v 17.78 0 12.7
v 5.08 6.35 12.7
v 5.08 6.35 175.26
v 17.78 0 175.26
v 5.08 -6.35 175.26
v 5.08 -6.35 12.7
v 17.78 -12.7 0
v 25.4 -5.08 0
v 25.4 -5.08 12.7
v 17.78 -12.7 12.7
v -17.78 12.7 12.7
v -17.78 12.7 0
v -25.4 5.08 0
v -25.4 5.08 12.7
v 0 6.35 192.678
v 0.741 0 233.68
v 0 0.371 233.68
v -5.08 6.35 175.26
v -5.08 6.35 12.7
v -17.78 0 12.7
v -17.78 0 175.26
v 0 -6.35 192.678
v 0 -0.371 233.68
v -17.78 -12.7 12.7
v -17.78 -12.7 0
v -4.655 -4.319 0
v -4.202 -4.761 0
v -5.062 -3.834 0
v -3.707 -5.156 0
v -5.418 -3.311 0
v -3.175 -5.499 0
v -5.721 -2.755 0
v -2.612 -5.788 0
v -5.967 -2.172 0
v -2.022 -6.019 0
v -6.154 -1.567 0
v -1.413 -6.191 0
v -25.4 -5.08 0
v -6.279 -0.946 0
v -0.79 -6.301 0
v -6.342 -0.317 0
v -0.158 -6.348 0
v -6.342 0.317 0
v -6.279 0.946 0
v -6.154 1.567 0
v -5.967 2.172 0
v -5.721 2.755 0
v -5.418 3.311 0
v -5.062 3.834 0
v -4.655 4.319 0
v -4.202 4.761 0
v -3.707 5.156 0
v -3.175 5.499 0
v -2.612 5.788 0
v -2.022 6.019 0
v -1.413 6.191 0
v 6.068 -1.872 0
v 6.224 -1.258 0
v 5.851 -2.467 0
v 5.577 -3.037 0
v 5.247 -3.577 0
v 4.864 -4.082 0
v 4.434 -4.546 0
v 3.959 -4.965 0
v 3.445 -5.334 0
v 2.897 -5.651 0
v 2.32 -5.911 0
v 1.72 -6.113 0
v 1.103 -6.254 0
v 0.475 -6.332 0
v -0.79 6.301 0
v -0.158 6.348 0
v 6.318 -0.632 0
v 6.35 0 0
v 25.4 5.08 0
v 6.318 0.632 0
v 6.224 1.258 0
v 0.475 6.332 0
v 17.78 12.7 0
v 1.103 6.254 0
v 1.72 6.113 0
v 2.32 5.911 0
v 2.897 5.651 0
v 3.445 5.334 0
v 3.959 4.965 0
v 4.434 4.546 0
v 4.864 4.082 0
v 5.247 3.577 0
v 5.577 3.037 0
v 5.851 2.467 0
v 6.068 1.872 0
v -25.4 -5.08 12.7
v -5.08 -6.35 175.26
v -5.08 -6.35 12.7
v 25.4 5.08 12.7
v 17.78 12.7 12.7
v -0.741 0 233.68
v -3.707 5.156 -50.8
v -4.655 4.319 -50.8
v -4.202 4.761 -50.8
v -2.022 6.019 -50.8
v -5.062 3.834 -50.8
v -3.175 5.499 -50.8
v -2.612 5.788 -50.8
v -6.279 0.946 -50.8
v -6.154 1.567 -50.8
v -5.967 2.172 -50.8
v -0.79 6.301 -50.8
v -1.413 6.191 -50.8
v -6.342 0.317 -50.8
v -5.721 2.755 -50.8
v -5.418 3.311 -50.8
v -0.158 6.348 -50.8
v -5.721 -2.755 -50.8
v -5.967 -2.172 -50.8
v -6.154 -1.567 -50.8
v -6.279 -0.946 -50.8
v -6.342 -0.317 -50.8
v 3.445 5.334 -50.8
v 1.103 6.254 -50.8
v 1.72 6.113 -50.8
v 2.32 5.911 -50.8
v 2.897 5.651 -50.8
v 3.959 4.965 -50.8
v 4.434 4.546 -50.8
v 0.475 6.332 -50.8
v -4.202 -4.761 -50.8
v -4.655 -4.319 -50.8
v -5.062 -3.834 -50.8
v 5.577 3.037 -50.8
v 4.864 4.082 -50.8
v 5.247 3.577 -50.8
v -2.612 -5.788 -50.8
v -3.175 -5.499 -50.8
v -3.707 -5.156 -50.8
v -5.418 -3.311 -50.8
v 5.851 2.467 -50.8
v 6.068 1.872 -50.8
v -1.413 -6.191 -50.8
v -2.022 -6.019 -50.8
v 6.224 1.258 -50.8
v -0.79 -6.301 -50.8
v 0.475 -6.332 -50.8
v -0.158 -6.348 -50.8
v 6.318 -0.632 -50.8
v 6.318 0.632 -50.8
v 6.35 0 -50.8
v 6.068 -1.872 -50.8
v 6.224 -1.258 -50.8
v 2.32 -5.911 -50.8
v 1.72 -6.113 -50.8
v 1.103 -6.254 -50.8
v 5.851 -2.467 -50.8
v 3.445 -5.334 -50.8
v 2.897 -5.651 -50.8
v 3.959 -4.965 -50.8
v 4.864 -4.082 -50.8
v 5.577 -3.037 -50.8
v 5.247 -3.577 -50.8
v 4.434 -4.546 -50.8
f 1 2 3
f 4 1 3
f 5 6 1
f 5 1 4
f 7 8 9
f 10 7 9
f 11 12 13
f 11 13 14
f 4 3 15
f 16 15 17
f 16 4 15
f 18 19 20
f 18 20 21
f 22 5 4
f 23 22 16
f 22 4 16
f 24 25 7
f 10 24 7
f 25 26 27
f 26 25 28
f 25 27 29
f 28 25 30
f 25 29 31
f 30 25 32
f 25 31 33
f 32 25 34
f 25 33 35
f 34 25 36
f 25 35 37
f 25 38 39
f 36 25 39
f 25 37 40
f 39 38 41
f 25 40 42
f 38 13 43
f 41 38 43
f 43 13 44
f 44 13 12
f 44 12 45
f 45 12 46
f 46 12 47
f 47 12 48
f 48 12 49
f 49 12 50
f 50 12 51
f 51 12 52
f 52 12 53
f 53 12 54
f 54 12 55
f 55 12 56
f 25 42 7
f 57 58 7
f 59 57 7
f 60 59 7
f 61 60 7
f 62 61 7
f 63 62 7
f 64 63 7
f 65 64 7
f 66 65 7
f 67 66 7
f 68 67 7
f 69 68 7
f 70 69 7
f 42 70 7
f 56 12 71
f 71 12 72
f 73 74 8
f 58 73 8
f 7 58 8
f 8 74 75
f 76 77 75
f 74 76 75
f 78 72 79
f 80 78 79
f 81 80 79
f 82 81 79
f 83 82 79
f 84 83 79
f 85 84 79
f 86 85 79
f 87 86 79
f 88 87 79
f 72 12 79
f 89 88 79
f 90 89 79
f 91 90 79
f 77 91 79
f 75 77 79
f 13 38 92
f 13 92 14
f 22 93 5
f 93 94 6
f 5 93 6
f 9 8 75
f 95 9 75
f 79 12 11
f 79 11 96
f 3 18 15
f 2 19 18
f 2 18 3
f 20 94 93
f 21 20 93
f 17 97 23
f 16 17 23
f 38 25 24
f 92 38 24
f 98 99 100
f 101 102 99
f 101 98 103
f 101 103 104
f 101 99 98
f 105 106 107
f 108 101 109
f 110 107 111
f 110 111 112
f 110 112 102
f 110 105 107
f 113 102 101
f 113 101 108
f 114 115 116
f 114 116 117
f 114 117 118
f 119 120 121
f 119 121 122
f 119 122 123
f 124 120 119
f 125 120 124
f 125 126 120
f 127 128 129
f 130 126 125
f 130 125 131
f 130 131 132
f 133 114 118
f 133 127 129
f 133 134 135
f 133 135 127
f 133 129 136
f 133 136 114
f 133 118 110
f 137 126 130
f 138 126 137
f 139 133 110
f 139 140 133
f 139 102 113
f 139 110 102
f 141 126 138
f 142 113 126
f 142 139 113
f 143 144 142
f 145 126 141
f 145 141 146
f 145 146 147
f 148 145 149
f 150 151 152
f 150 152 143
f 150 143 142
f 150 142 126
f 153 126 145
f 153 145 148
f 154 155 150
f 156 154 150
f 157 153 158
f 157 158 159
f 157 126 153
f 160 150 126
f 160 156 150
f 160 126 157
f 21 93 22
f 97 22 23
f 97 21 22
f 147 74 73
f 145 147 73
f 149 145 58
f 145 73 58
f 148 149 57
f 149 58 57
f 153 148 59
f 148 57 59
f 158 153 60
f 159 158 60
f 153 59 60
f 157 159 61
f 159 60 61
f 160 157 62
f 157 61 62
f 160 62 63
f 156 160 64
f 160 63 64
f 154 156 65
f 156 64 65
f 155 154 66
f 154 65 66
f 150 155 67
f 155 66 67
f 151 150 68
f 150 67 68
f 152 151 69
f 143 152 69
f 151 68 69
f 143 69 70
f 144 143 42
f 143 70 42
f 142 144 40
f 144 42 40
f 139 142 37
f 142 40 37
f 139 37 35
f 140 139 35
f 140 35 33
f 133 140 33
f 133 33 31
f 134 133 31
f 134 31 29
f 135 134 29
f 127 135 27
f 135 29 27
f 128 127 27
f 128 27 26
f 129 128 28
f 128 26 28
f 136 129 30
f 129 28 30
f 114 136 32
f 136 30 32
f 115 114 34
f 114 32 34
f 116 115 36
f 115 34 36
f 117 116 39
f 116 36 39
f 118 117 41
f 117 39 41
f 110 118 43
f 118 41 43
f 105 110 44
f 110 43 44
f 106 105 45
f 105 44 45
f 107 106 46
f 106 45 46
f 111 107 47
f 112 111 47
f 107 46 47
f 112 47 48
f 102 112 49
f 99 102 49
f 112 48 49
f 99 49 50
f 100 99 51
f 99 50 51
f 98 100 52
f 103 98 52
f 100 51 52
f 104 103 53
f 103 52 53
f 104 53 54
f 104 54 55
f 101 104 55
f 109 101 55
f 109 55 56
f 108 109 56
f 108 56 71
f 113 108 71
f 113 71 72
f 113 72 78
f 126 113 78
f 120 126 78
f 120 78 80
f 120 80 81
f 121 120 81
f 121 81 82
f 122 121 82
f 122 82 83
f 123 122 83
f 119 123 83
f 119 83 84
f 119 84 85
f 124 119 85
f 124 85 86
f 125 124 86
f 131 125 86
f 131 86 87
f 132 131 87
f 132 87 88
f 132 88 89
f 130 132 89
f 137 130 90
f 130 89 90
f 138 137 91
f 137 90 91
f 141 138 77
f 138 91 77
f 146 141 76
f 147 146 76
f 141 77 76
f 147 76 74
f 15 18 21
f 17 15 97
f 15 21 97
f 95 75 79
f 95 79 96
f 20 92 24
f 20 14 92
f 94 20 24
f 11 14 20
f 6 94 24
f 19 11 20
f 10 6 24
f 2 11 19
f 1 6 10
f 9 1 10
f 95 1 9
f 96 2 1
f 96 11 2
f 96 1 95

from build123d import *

# Parameters (mm, degrees)
F0_W        = 50.8
F0_H        = 25.4
F1_DEPTH    = 12.7
F2_R        = 6.35
F3_DEPTH    = 50.8
F4_W        = 35.56
F4_H        = 12.7
F5_DEPTH    = 220.98
F6_SIZE2    = 12.69999
F6_SIZE     = 6.34999
F6_2_SIZE2  = 12.69999
F6_2_SIZE   = 6.34999
F7_T1_DEPTH = 317.8886374297
F7_T3_DEPTH = 317.8886374297
F7_T5_DEPTH = 317.8886374297
F7_T7_DEPTH = 317.8886374297
F8_SIZE2    = 7.62
F8_SIZE     = 7.62


# Not quite as in the source:
# - a fillet or chamfer that OpenCascade refuses, or shapes differently, is made with other operations: its cross-section is extruded or revolved along the edge and cut away or added
# - a fillet or chamfer is up to 0.001 mm smaller than in the source, because OpenCascade refuses the exact size


with BuildPart() as f1:
    # F0 (on Top) → F1 (new body)
    with BuildSketch(Plane.XY):
        Rectangle(F0_W, F0_H)
    extrude(amount=F1_DEPTH)

    # F2 (on face) → F3 (join)
    with BuildSketch(Plane(origin=(0, 0, 0), x_dir=(1, 0, 0), z_dir=(0, 0, -1))):
        Circle(F2_R)
    extrude(amount=F3_DEPTH)

    # F4 (on face) → F5 (join)
    with BuildSketch(Plane.XY.offset(12.7)):
        Rectangle(F4_W, F4_H)
    extrude(amount=F5_DEPTH)

    # F6 (size 6.35 and 12.7 in the source; OpenCascade refuses exactly that, so slightly less here)
    f6_edges = [f1.edges().sort_by_distance(p)[0] for p in [
        (17.78, -6.35, 123.19),
        (17.78, 6.35, 123.19),
    ]]
    f6_side = f1.faces().sort_by_distance((17.78, 0, 123.19))[0]
    chamfer(f6_edges, length=F6_SIZE, length2=F6_SIZE2, reference=f6_side)

    # F6#2 (size 6.35 and 12.7 in the source; OpenCascade refuses exactly that, so slightly less here)
    f6_2_edges = [f1.edges().sort_by_distance(p)[0] for p in [
        (-17.78, 6.35, 123.19),
        (-17.78, -6.35, 123.19),
    ]]
    f6_2_side = f1.faces().sort_by_distance((-17.78, 0, 123.19))[0]
    chamfer(f6_2_edges, length=F6_2_SIZE, length2=F6_2_SIZE2, reference=f6_2_side)

    # F7: chamfer of 7.62 x 58.42 on 4 edges, made by hand

    # F7_s2 → F7_t1 (cut)
    with BuildSketch(Plane(origin=(150.0381483816, -75.0190151206, 0), x_dir=(0, 0, 1), z_dir=(-0.8944273319, 0.4472133138, 0))):
        Polygon((175.26, 7.9514616635), (233.68, 0.3314616635), (233.68, 7.9514616635), align=None)
    extrude(amount=F7_T1_DEPTH, mode=Mode.SUBTRACT)

    # F7_s4 → F7_t3 (cut)
    with BuildSketch(Plane(origin=(150.0381483816, 75.0190151206, 0), x_dir=(0, 0, 1), z_dir=(-0.8944273319, -0.4472133138, 0))):
        Polygon((175.26, -7.9514616635), (233.68, -0.3314616635), (233.68, -7.9514616635), align=None)
    extrude(amount=F7_T3_DEPTH, mode=Mode.SUBTRACT)

    # F7_s6 → F7_t5 (cut)
    with BuildSketch(Plane(origin=(-150.0381483816, 75.0190151206, 0), x_dir=(0, 0, 1), z_dir=(0.8944273319, -0.4472133138, 0))):
        Polygon((175.26, 7.9514616635), (233.68, 0.3314616635), (233.68, 7.9514616635), align=None)
    extrude(amount=F7_T5_DEPTH, mode=Mode.SUBTRACT)

    # F7_s8 → F7_t7 (cut)
    with BuildSketch(Plane(origin=(-150.0381483816, -75.0190151206, 0), x_dir=(0, 0, 1), z_dir=(0.8944273319, 0.4472133138, 0))):
        Polygon((175.26, -7.9514616635), (233.68, -0.3314616635), (233.68, -7.9514616635), align=None)
    extrude(amount=F7_T7_DEPTH, mode=Mode.SUBTRACT)

    # F8
    f8_edges = [f1.edges().sort_by_distance(p)[0] for p in [
        (-25.4, -12.7, 6.35),
        (25.4, -12.7, 6.35),
        (25.4, 12.7, 6.35),
        (-25.4, 12.7, 6.35),
    ]]
    chamfer(f8_edges, length=F8_SIZE, length2=F8_SIZE2)


solid = f1.part
